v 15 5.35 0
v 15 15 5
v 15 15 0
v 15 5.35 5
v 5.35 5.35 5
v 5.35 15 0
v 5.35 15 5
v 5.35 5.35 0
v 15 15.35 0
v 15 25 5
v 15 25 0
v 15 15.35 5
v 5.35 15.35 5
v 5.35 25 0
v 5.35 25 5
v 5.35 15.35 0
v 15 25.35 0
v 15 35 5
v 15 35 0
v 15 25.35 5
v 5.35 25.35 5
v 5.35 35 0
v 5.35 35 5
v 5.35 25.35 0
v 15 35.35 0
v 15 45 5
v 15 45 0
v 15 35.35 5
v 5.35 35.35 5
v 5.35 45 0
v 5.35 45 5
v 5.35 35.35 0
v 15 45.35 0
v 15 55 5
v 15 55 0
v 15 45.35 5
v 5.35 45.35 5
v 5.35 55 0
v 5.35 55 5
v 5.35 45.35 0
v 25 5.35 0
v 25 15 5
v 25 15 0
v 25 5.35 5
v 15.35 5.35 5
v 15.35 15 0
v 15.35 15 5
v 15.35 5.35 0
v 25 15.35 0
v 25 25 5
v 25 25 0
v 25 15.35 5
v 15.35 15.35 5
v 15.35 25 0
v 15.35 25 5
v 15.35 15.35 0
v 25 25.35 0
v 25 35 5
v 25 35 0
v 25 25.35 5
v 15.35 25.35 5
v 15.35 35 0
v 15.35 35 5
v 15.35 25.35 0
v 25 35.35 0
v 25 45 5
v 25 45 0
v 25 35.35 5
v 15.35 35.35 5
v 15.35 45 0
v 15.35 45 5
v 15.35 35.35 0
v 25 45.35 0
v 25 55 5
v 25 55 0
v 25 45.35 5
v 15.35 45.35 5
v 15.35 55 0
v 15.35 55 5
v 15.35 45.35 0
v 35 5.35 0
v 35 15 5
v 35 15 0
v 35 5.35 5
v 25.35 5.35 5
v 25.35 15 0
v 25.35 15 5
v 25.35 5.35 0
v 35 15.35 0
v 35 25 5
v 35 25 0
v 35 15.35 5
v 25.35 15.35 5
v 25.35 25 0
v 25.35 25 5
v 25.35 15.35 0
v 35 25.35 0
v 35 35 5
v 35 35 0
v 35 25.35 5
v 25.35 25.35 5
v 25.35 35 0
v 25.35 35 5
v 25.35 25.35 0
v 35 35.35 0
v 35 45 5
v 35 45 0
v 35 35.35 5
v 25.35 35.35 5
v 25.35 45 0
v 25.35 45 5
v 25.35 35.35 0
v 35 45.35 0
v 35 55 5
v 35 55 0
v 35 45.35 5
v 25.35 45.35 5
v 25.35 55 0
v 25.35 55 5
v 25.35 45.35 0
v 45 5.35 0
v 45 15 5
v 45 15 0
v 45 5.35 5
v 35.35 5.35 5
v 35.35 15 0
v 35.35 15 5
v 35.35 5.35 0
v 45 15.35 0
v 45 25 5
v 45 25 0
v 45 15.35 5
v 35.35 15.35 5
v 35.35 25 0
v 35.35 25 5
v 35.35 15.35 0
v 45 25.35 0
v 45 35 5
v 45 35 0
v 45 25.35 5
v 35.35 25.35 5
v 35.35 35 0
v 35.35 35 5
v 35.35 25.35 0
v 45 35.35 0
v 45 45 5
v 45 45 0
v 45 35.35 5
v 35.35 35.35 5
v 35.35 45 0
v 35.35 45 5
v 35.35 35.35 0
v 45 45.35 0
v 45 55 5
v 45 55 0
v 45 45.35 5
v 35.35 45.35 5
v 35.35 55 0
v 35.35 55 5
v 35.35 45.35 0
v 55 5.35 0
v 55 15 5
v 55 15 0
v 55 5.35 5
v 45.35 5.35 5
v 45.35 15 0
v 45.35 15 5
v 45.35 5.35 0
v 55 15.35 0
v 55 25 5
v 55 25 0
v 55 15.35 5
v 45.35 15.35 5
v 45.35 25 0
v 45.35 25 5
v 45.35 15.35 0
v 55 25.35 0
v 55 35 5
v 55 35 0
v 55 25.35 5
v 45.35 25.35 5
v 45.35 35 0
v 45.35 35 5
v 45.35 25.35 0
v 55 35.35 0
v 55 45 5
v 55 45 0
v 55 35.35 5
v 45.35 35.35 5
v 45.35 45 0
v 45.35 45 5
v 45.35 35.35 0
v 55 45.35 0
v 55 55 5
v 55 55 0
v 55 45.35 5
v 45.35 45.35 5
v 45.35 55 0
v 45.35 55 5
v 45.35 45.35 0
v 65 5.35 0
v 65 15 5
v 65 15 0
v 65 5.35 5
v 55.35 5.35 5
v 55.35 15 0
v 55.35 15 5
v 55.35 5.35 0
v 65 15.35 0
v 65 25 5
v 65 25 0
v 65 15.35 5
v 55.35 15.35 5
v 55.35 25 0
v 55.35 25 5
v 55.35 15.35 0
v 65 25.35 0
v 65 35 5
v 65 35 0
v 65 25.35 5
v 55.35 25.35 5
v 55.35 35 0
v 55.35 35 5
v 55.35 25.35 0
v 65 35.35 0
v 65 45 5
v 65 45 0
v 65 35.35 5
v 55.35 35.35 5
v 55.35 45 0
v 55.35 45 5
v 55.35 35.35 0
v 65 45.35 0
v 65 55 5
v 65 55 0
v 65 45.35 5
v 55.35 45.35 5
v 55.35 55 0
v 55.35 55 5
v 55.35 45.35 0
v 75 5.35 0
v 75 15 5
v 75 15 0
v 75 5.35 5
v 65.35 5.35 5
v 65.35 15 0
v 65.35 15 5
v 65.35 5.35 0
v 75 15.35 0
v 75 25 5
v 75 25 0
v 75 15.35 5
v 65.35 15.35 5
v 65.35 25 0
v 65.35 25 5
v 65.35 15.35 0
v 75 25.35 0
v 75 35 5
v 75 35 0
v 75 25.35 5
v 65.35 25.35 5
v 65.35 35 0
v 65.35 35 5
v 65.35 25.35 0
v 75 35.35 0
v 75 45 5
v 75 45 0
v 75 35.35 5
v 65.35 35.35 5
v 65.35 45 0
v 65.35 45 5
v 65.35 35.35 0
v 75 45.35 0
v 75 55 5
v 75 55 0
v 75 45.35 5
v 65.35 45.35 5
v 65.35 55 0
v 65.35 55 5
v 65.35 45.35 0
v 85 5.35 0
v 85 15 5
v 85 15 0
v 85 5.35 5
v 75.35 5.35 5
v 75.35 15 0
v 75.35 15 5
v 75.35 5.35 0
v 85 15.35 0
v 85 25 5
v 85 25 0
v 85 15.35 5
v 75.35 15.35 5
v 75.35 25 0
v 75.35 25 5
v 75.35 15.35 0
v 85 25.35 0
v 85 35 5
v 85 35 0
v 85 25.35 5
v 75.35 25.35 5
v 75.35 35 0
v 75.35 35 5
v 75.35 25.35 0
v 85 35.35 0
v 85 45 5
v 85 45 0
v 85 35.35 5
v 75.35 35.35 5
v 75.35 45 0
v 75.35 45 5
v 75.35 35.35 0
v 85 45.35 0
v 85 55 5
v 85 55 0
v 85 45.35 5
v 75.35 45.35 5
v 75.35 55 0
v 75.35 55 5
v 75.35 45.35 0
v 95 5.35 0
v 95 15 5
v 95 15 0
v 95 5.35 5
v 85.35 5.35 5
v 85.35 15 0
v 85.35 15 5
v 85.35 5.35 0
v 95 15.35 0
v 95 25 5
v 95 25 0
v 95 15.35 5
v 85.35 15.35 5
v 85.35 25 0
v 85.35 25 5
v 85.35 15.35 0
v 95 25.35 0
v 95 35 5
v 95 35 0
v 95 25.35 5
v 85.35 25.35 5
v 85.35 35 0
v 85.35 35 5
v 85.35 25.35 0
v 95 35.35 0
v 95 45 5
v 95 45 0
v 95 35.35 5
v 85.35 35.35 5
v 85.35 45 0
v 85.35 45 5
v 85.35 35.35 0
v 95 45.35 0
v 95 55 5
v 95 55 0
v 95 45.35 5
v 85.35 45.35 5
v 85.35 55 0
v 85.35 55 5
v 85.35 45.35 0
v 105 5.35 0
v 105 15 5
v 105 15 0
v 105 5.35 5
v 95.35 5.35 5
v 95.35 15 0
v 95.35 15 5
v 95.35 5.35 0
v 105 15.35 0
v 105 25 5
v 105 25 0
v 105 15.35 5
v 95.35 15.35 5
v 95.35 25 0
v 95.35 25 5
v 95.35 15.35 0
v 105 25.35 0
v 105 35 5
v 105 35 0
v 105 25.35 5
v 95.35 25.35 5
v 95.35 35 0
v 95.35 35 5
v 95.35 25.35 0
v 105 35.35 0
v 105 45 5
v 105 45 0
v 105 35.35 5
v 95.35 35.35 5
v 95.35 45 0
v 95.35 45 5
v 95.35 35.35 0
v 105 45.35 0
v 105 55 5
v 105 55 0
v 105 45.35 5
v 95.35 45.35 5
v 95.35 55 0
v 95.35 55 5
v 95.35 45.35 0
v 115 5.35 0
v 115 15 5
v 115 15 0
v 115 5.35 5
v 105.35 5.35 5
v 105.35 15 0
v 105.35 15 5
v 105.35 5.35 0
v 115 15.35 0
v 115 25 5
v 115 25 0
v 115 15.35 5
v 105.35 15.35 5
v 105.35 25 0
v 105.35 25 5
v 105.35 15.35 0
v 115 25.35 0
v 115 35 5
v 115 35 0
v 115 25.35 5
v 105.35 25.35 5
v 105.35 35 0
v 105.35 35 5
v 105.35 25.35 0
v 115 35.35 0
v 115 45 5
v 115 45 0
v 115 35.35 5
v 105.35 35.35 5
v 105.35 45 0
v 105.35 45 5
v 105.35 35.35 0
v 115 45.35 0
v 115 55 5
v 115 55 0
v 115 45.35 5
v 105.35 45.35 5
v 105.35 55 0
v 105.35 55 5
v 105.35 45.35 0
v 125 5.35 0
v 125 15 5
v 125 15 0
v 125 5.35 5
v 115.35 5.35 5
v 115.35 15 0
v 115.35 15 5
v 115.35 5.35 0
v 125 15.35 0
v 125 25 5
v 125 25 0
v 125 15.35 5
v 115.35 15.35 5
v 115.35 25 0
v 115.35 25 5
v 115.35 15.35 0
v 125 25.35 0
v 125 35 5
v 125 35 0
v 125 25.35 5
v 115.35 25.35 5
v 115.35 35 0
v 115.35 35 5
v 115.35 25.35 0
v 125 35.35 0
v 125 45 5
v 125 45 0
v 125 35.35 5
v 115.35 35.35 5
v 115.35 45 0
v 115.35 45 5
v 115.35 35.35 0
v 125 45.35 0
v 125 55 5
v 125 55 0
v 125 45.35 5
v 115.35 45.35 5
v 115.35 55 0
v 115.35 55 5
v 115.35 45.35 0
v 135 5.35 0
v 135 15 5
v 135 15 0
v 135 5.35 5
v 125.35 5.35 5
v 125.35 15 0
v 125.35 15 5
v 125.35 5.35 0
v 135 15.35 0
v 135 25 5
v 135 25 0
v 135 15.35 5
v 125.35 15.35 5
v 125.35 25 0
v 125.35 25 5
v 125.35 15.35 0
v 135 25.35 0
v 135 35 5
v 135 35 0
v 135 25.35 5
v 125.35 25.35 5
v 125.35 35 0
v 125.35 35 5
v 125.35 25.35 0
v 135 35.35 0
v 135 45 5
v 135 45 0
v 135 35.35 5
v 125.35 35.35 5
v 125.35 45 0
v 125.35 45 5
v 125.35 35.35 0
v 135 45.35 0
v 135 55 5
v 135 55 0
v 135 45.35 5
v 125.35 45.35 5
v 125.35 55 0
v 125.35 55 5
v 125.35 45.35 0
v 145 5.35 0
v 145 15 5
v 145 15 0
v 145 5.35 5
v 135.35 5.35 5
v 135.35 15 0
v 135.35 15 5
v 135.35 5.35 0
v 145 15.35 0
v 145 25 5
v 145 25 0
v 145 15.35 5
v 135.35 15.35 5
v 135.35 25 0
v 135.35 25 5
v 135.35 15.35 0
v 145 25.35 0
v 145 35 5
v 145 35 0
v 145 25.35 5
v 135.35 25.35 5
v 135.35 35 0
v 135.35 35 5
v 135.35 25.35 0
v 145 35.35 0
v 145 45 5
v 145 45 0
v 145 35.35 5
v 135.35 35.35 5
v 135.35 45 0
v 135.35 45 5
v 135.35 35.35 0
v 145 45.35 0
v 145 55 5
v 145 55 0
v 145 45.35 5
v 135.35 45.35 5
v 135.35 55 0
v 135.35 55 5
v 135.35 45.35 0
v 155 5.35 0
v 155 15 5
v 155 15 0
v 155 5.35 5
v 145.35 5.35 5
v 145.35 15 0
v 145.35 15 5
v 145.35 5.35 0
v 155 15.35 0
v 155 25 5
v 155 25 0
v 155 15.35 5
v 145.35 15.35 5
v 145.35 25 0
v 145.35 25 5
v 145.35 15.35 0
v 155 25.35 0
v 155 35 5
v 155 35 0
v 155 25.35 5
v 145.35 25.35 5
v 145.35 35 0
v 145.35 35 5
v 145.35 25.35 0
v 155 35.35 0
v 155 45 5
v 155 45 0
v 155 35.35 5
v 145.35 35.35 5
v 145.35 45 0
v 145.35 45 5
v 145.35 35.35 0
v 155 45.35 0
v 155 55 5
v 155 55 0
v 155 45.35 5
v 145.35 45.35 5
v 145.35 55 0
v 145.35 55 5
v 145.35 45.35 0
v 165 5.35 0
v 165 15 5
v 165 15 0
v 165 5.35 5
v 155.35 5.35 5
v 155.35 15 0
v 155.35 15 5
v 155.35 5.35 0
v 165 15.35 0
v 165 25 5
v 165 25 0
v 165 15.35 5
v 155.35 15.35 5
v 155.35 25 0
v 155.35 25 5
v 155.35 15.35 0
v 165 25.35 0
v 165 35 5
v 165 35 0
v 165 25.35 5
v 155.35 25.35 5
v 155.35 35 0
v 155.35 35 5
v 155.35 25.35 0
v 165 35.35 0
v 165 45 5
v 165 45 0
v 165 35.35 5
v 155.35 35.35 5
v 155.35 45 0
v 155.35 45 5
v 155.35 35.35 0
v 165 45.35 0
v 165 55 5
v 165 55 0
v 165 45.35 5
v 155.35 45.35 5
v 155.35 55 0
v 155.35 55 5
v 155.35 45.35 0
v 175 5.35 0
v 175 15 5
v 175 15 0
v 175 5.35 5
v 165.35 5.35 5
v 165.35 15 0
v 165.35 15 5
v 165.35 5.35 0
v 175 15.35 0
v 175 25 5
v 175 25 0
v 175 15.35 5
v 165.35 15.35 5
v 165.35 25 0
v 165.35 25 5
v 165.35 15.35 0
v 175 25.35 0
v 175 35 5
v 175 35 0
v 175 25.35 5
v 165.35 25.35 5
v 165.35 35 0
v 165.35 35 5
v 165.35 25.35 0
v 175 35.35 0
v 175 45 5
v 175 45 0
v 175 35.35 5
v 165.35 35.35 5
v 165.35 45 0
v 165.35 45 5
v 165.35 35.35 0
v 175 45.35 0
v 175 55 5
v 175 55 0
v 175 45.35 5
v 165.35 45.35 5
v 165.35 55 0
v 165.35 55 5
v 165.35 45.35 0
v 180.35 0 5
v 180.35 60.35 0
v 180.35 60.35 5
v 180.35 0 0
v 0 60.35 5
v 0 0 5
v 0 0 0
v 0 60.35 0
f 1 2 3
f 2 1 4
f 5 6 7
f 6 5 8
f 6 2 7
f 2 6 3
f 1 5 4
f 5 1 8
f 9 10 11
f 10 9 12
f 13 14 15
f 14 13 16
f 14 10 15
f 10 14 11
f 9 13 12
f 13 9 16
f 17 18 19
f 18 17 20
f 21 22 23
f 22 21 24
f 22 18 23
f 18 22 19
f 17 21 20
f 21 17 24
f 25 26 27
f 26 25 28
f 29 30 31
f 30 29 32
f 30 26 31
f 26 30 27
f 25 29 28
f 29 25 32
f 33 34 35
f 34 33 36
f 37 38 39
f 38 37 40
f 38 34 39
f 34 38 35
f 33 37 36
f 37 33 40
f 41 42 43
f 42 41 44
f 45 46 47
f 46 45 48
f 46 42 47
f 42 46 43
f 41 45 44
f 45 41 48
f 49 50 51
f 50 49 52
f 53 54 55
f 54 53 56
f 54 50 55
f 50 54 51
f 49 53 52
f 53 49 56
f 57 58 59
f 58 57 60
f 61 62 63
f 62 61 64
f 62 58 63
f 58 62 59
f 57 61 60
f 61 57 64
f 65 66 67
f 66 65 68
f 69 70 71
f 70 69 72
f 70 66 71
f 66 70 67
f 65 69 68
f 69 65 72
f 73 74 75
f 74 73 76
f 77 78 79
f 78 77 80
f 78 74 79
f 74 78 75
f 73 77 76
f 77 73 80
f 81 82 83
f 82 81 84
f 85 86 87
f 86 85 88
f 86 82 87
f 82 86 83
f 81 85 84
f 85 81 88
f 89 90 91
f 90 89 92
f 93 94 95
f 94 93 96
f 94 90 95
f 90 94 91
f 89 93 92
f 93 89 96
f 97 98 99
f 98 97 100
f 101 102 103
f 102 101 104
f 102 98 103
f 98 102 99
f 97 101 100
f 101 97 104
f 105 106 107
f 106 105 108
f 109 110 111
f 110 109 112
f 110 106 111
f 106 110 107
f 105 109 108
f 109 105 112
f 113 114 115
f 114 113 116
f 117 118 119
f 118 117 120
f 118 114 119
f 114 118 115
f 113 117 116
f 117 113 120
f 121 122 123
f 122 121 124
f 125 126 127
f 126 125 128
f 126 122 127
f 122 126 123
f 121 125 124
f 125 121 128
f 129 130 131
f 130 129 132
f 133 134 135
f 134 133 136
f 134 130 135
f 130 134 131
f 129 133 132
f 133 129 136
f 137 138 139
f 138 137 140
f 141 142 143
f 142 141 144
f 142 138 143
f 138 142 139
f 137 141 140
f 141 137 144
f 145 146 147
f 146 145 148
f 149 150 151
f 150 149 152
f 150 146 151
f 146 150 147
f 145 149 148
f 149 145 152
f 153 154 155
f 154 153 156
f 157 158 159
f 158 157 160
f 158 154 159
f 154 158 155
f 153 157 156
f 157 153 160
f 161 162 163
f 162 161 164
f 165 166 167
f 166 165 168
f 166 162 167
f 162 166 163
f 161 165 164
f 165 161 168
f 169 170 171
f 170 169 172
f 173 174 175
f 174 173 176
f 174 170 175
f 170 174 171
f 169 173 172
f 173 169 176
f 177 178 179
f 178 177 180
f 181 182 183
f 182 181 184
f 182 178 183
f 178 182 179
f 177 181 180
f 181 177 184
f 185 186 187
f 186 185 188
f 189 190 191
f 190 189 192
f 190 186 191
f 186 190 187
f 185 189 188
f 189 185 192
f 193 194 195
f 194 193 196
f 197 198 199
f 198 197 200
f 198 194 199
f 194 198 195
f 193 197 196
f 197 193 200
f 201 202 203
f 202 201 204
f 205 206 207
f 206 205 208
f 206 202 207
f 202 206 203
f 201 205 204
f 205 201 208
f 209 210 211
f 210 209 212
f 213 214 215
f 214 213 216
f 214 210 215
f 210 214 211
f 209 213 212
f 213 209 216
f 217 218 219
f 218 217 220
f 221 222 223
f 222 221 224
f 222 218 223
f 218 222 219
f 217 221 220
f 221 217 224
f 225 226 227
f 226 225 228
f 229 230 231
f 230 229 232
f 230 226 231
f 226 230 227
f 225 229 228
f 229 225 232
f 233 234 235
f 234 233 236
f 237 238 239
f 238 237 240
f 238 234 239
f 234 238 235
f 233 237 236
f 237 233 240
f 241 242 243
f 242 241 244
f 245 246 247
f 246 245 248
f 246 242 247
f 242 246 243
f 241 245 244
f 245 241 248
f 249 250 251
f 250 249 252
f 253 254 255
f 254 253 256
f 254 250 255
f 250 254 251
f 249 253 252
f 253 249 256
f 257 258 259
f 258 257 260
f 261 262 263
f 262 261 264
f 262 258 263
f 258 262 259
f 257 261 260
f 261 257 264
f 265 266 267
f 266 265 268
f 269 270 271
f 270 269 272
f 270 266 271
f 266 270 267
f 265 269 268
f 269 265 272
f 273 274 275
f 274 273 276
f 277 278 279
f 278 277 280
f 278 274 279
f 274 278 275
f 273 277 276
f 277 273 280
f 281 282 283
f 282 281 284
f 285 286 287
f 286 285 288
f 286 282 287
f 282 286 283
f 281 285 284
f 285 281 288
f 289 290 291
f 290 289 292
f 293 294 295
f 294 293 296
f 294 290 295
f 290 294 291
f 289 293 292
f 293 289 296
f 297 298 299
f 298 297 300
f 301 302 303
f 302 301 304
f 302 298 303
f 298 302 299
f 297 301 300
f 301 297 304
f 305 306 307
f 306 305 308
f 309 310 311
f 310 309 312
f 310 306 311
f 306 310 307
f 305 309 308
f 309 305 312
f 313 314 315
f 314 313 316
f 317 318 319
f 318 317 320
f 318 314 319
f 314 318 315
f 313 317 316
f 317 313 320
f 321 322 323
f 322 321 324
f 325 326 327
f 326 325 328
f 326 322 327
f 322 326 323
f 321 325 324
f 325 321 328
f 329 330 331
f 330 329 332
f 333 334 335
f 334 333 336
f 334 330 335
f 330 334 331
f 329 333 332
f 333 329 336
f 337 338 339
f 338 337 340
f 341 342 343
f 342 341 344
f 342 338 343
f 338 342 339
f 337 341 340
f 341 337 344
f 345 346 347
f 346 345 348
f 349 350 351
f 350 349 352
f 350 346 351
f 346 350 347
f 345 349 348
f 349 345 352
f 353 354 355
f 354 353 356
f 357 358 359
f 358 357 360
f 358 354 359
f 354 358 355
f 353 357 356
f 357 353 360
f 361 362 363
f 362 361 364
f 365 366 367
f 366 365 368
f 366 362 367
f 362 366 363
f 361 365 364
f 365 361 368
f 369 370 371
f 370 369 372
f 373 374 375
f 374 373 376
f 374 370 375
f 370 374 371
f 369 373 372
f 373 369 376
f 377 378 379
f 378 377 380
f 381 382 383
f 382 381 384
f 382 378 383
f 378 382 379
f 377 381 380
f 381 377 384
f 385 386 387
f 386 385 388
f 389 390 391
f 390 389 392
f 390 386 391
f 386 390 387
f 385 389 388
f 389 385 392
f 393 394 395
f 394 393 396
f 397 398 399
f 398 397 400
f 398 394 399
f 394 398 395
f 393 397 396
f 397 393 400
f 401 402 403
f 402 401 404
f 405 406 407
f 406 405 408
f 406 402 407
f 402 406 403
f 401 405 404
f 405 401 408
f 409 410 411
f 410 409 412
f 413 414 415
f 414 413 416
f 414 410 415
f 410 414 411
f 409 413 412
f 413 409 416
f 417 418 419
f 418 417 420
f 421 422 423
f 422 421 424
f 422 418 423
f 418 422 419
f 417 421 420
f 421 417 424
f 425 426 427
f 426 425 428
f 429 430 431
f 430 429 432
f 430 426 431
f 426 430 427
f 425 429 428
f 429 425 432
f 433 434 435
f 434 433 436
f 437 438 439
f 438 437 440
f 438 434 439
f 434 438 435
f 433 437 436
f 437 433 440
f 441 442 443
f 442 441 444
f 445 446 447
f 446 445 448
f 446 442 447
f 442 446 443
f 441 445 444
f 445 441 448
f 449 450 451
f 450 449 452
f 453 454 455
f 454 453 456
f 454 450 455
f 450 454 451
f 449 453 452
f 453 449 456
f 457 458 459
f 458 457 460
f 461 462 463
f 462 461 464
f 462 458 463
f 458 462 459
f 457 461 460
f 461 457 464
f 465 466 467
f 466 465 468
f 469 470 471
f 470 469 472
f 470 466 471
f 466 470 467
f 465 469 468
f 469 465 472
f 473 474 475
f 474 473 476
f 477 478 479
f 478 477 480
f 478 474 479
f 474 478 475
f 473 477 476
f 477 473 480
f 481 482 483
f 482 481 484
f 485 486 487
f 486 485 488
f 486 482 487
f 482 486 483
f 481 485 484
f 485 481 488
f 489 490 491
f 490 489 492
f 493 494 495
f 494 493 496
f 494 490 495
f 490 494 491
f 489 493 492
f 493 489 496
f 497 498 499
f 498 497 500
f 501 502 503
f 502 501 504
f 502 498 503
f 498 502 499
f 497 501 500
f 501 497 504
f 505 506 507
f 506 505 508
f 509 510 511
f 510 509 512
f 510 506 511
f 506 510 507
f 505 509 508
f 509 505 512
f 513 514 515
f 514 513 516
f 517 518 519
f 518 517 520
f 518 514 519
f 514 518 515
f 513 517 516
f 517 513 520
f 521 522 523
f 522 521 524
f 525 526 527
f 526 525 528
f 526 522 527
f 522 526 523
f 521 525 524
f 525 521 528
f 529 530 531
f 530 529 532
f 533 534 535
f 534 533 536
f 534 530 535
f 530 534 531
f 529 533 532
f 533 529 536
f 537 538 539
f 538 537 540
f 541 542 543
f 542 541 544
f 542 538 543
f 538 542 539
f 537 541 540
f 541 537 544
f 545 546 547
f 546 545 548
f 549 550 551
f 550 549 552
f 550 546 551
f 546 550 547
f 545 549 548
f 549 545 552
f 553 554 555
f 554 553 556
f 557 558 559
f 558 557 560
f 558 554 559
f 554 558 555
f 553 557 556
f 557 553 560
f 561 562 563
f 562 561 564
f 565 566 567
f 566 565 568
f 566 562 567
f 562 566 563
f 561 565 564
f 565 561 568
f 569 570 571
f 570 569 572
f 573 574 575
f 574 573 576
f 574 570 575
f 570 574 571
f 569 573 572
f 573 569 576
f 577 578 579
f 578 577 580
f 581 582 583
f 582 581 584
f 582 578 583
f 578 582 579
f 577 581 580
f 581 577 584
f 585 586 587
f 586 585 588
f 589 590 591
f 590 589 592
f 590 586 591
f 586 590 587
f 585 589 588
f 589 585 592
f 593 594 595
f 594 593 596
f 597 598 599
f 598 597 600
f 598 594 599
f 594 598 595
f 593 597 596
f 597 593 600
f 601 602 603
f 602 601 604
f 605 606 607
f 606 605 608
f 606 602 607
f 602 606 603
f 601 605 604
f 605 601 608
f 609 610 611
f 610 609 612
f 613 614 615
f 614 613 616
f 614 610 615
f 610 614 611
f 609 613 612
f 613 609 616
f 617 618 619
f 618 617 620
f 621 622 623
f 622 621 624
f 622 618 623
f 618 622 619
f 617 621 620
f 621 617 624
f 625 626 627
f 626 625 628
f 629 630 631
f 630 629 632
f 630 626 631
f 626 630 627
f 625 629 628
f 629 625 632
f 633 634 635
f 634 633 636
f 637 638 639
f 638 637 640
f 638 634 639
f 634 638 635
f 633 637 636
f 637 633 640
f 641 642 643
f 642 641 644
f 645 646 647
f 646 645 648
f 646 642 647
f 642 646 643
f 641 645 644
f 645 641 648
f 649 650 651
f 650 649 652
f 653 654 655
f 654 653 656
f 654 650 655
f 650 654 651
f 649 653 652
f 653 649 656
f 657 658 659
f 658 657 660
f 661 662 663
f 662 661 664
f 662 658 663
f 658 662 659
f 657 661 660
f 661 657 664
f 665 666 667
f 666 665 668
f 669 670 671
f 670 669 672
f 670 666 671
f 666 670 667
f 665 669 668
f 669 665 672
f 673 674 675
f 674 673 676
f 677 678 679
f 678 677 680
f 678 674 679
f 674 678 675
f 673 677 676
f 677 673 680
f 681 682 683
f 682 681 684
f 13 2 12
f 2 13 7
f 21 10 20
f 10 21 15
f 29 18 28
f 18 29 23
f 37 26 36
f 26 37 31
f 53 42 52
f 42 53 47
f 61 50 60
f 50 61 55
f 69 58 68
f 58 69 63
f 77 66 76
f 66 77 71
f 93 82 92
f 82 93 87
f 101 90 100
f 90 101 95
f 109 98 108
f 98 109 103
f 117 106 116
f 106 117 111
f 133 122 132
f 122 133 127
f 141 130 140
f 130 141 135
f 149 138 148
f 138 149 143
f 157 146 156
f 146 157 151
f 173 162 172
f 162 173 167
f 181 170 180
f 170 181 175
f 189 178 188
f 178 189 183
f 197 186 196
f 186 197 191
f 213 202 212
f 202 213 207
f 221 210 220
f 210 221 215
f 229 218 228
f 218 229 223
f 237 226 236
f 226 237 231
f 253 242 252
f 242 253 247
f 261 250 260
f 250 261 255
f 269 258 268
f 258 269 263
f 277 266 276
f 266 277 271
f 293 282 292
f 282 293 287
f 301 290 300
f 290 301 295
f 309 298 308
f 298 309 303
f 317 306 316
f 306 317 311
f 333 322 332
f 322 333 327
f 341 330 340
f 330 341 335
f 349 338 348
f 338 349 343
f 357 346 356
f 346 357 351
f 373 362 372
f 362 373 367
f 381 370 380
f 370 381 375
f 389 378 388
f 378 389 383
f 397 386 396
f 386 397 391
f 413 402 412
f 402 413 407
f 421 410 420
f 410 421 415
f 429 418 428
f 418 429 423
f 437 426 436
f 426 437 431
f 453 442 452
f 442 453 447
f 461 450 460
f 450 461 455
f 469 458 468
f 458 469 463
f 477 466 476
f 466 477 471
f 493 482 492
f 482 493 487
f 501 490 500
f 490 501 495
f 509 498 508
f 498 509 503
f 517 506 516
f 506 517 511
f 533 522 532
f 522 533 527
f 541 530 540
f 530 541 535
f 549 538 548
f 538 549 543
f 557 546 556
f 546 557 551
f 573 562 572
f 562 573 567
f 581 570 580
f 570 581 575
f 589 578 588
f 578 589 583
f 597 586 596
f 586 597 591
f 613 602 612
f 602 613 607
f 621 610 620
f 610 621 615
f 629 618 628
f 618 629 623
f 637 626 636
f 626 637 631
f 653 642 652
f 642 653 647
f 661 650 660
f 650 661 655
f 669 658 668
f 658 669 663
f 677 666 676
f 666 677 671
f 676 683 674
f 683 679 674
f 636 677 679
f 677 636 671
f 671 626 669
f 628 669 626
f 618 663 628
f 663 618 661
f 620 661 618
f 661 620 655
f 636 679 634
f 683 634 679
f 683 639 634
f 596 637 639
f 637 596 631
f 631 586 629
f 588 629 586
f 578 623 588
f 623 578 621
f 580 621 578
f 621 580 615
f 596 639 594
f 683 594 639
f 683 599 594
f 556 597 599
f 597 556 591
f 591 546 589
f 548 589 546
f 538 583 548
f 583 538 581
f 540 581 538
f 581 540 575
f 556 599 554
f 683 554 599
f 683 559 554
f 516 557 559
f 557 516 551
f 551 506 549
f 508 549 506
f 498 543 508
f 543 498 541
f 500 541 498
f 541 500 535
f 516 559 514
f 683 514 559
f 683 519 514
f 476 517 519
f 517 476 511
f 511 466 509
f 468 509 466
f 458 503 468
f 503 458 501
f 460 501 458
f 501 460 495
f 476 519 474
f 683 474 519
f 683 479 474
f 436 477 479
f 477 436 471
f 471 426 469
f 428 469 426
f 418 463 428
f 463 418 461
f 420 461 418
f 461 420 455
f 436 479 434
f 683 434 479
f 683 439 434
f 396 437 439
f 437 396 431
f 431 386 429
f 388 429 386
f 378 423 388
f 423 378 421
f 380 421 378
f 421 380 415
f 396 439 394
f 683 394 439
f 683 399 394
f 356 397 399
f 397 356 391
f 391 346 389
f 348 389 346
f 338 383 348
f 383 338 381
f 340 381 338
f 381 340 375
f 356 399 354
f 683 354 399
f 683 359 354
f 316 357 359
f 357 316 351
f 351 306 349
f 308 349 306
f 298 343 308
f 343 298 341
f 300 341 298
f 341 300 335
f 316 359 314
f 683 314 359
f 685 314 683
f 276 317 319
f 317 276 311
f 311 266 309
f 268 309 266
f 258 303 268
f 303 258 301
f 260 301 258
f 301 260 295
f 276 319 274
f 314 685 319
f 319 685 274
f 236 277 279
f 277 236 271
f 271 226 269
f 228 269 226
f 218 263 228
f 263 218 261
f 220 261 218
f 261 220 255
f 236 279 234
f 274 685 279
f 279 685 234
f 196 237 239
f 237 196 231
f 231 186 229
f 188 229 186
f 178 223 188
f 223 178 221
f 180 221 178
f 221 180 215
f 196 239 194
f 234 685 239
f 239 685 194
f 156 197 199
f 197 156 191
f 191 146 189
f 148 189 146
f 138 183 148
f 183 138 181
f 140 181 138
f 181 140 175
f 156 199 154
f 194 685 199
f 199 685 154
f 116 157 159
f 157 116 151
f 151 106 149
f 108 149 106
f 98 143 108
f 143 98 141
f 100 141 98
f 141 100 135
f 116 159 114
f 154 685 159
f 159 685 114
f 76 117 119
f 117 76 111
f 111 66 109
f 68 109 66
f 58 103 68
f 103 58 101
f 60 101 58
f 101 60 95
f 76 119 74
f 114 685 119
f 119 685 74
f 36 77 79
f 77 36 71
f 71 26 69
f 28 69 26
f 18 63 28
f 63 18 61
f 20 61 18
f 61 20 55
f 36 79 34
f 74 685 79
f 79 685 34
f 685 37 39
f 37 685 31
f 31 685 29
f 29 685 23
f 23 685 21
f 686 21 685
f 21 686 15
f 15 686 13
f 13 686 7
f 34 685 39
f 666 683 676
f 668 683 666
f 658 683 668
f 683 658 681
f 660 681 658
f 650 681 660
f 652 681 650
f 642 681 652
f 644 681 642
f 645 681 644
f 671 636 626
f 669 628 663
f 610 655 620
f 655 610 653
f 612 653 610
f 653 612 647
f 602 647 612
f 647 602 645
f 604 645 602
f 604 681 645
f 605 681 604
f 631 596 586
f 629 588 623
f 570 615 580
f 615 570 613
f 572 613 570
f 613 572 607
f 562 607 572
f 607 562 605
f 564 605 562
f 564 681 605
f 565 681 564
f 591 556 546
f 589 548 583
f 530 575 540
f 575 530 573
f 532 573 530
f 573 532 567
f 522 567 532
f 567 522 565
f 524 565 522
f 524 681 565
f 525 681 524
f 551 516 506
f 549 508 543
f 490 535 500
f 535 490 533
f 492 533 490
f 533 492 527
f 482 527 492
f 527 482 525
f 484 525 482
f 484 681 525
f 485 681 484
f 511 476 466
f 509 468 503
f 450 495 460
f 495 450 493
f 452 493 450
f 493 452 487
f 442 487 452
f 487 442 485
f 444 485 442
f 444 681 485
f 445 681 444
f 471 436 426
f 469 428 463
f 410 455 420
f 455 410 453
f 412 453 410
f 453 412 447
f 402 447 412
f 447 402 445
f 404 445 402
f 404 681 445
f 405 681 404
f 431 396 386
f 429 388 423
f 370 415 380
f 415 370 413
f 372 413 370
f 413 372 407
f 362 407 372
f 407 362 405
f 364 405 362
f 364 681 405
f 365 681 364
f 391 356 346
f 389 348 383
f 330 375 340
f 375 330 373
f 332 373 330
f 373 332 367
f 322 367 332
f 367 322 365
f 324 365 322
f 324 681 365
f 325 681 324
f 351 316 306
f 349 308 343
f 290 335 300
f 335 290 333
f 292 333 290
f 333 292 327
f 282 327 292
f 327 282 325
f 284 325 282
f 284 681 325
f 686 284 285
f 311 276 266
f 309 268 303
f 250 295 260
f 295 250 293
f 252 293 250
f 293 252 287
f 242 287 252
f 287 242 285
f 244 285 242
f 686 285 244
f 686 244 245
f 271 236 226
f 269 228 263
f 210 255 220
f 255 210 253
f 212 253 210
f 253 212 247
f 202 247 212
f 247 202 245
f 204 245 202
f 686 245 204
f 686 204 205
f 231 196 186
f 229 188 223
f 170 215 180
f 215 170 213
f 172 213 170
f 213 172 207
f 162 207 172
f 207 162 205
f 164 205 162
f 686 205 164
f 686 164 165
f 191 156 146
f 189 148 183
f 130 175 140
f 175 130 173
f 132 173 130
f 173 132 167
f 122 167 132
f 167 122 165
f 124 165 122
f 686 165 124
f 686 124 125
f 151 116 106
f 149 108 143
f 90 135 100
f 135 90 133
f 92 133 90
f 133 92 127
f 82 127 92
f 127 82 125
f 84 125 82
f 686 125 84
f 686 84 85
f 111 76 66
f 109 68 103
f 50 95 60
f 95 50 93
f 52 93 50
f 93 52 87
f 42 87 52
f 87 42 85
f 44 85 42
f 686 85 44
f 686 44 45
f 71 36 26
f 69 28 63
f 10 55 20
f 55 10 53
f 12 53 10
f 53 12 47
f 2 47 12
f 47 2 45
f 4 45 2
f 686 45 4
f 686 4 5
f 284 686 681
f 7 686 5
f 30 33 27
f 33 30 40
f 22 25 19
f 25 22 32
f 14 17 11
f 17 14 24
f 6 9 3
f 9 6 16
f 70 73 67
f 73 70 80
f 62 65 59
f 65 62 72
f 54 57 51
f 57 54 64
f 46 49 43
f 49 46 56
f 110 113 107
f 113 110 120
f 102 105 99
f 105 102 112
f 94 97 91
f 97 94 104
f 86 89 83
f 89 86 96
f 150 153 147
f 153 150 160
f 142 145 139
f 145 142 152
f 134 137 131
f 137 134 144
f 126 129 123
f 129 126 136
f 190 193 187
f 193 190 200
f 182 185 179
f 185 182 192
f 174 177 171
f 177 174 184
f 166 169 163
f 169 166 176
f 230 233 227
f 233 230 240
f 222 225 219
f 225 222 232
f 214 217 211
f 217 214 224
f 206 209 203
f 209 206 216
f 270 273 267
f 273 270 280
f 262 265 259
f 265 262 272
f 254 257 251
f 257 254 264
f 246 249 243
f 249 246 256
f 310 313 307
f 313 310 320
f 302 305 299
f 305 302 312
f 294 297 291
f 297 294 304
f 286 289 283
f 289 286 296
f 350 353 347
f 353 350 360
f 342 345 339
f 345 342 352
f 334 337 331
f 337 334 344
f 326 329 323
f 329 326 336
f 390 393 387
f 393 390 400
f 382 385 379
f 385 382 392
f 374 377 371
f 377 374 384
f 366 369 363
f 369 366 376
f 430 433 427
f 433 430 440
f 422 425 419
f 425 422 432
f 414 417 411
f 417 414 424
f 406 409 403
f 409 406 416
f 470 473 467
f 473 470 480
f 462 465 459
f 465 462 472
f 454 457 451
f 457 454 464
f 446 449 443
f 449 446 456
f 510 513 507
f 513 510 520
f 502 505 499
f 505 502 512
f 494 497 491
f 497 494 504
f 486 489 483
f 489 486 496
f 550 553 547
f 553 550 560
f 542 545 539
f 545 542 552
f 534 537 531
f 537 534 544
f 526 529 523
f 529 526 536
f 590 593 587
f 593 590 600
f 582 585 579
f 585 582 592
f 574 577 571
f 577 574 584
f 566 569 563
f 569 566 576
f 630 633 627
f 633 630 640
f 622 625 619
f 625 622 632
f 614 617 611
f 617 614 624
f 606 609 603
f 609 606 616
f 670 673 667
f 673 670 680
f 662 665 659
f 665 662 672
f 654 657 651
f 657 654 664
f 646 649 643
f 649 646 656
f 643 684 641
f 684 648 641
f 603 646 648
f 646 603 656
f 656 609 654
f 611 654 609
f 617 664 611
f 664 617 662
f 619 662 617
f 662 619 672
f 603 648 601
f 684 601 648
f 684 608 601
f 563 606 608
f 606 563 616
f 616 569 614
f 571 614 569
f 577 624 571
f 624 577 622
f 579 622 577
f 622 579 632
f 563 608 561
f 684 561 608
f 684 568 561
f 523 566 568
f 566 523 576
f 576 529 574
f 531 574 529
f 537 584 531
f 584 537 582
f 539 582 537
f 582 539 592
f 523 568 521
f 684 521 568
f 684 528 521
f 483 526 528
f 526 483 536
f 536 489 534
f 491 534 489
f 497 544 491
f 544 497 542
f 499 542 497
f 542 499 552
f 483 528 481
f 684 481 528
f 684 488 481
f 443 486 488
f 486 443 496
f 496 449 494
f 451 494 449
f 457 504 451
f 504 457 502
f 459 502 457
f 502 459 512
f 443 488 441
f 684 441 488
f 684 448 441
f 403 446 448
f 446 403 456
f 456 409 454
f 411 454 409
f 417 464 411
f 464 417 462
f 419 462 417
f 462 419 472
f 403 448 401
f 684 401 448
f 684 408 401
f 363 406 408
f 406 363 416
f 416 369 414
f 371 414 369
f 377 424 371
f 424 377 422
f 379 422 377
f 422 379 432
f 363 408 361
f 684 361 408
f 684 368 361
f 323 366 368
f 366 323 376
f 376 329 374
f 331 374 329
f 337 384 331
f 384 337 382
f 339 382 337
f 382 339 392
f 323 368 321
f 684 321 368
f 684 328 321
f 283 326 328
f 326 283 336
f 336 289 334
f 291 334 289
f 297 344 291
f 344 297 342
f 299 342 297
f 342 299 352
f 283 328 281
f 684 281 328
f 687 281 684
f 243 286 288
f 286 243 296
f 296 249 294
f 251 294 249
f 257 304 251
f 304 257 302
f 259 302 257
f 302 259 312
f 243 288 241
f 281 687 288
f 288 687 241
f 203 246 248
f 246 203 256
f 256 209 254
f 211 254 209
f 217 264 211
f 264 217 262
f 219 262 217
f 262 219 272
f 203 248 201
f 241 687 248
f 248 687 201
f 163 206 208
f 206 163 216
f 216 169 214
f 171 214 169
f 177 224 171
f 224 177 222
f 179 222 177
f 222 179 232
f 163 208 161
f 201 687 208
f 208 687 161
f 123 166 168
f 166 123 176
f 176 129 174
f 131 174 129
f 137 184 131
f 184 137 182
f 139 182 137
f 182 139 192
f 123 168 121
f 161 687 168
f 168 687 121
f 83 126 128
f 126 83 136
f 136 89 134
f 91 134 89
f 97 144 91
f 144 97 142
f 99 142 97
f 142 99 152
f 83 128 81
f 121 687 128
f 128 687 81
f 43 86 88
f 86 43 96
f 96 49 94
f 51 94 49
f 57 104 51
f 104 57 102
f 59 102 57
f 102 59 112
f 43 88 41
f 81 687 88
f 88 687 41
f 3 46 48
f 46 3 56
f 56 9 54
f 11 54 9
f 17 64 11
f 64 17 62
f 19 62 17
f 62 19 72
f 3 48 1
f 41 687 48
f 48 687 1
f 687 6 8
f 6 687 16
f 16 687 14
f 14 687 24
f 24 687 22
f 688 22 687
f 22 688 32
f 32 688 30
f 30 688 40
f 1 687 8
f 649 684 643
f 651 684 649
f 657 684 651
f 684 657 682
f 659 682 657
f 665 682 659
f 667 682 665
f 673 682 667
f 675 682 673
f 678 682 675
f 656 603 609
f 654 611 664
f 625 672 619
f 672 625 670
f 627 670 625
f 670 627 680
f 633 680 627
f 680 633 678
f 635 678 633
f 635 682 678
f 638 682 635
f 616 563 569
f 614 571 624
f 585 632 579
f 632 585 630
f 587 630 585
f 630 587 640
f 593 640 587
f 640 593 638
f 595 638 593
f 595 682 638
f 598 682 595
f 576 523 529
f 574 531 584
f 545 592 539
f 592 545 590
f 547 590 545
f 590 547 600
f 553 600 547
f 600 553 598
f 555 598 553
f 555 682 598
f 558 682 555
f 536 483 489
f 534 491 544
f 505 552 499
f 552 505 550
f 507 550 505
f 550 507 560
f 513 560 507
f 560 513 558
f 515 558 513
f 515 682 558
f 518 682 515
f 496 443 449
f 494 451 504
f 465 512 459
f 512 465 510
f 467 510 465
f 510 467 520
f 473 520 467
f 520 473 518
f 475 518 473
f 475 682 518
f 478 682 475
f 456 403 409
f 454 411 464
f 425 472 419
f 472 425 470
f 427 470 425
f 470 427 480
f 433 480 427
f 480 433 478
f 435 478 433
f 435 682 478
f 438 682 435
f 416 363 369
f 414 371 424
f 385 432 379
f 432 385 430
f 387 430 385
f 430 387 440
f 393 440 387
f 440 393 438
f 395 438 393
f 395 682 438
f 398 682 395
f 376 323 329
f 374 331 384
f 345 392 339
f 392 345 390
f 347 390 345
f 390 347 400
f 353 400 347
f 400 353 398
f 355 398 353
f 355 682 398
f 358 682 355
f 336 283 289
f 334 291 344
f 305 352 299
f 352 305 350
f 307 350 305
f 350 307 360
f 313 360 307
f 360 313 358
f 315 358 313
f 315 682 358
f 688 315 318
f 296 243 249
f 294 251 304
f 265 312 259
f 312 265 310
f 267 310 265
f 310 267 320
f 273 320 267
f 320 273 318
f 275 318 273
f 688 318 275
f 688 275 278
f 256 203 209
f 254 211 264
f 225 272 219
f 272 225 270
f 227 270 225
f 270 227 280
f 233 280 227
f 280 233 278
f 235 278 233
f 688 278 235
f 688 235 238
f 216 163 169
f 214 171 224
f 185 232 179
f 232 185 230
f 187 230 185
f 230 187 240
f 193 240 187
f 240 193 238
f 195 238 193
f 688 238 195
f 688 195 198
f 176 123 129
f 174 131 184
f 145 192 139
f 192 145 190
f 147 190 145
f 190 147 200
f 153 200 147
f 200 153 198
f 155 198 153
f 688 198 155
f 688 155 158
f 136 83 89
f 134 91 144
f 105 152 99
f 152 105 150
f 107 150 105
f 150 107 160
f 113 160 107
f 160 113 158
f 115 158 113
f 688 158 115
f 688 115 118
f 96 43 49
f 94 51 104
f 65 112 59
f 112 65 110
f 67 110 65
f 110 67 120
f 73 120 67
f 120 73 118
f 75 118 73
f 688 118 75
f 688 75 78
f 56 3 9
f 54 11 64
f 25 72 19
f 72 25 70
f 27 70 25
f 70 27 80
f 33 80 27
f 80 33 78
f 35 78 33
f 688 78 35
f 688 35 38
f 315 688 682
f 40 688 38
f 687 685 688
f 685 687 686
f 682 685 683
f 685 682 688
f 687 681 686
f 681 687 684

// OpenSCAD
cellHorPeriod = 10;
cellVertPeriod = 10;
bordHorThick = 5;
bordVertThick = 5;
horThick = 0.7;
verThick = 0.7;
horCells = 17;
vertCells = 5;
gridHeight = 5;

difference() {
	cube([horCells*cellHorPeriod+horThick/2+2*bordVertThick,vertCells*cellVertPeriod+verThick/2+2*bordHorThick,gridHeight]);

    for (i = [0:horCells-1]) {
        for (j = [0:vertCells-1]) {
            translate([i*cellHorPeriod + horThick/2 + bordVertThick, j*cellVertPeriod + verThick/2 + bordHorThick, -gridHeight]) {
                cube([cellHorPeriod - horThick/2, cellVertPeriod - verThick/2, gridHeight*3]);
            }
        }
    }

}
